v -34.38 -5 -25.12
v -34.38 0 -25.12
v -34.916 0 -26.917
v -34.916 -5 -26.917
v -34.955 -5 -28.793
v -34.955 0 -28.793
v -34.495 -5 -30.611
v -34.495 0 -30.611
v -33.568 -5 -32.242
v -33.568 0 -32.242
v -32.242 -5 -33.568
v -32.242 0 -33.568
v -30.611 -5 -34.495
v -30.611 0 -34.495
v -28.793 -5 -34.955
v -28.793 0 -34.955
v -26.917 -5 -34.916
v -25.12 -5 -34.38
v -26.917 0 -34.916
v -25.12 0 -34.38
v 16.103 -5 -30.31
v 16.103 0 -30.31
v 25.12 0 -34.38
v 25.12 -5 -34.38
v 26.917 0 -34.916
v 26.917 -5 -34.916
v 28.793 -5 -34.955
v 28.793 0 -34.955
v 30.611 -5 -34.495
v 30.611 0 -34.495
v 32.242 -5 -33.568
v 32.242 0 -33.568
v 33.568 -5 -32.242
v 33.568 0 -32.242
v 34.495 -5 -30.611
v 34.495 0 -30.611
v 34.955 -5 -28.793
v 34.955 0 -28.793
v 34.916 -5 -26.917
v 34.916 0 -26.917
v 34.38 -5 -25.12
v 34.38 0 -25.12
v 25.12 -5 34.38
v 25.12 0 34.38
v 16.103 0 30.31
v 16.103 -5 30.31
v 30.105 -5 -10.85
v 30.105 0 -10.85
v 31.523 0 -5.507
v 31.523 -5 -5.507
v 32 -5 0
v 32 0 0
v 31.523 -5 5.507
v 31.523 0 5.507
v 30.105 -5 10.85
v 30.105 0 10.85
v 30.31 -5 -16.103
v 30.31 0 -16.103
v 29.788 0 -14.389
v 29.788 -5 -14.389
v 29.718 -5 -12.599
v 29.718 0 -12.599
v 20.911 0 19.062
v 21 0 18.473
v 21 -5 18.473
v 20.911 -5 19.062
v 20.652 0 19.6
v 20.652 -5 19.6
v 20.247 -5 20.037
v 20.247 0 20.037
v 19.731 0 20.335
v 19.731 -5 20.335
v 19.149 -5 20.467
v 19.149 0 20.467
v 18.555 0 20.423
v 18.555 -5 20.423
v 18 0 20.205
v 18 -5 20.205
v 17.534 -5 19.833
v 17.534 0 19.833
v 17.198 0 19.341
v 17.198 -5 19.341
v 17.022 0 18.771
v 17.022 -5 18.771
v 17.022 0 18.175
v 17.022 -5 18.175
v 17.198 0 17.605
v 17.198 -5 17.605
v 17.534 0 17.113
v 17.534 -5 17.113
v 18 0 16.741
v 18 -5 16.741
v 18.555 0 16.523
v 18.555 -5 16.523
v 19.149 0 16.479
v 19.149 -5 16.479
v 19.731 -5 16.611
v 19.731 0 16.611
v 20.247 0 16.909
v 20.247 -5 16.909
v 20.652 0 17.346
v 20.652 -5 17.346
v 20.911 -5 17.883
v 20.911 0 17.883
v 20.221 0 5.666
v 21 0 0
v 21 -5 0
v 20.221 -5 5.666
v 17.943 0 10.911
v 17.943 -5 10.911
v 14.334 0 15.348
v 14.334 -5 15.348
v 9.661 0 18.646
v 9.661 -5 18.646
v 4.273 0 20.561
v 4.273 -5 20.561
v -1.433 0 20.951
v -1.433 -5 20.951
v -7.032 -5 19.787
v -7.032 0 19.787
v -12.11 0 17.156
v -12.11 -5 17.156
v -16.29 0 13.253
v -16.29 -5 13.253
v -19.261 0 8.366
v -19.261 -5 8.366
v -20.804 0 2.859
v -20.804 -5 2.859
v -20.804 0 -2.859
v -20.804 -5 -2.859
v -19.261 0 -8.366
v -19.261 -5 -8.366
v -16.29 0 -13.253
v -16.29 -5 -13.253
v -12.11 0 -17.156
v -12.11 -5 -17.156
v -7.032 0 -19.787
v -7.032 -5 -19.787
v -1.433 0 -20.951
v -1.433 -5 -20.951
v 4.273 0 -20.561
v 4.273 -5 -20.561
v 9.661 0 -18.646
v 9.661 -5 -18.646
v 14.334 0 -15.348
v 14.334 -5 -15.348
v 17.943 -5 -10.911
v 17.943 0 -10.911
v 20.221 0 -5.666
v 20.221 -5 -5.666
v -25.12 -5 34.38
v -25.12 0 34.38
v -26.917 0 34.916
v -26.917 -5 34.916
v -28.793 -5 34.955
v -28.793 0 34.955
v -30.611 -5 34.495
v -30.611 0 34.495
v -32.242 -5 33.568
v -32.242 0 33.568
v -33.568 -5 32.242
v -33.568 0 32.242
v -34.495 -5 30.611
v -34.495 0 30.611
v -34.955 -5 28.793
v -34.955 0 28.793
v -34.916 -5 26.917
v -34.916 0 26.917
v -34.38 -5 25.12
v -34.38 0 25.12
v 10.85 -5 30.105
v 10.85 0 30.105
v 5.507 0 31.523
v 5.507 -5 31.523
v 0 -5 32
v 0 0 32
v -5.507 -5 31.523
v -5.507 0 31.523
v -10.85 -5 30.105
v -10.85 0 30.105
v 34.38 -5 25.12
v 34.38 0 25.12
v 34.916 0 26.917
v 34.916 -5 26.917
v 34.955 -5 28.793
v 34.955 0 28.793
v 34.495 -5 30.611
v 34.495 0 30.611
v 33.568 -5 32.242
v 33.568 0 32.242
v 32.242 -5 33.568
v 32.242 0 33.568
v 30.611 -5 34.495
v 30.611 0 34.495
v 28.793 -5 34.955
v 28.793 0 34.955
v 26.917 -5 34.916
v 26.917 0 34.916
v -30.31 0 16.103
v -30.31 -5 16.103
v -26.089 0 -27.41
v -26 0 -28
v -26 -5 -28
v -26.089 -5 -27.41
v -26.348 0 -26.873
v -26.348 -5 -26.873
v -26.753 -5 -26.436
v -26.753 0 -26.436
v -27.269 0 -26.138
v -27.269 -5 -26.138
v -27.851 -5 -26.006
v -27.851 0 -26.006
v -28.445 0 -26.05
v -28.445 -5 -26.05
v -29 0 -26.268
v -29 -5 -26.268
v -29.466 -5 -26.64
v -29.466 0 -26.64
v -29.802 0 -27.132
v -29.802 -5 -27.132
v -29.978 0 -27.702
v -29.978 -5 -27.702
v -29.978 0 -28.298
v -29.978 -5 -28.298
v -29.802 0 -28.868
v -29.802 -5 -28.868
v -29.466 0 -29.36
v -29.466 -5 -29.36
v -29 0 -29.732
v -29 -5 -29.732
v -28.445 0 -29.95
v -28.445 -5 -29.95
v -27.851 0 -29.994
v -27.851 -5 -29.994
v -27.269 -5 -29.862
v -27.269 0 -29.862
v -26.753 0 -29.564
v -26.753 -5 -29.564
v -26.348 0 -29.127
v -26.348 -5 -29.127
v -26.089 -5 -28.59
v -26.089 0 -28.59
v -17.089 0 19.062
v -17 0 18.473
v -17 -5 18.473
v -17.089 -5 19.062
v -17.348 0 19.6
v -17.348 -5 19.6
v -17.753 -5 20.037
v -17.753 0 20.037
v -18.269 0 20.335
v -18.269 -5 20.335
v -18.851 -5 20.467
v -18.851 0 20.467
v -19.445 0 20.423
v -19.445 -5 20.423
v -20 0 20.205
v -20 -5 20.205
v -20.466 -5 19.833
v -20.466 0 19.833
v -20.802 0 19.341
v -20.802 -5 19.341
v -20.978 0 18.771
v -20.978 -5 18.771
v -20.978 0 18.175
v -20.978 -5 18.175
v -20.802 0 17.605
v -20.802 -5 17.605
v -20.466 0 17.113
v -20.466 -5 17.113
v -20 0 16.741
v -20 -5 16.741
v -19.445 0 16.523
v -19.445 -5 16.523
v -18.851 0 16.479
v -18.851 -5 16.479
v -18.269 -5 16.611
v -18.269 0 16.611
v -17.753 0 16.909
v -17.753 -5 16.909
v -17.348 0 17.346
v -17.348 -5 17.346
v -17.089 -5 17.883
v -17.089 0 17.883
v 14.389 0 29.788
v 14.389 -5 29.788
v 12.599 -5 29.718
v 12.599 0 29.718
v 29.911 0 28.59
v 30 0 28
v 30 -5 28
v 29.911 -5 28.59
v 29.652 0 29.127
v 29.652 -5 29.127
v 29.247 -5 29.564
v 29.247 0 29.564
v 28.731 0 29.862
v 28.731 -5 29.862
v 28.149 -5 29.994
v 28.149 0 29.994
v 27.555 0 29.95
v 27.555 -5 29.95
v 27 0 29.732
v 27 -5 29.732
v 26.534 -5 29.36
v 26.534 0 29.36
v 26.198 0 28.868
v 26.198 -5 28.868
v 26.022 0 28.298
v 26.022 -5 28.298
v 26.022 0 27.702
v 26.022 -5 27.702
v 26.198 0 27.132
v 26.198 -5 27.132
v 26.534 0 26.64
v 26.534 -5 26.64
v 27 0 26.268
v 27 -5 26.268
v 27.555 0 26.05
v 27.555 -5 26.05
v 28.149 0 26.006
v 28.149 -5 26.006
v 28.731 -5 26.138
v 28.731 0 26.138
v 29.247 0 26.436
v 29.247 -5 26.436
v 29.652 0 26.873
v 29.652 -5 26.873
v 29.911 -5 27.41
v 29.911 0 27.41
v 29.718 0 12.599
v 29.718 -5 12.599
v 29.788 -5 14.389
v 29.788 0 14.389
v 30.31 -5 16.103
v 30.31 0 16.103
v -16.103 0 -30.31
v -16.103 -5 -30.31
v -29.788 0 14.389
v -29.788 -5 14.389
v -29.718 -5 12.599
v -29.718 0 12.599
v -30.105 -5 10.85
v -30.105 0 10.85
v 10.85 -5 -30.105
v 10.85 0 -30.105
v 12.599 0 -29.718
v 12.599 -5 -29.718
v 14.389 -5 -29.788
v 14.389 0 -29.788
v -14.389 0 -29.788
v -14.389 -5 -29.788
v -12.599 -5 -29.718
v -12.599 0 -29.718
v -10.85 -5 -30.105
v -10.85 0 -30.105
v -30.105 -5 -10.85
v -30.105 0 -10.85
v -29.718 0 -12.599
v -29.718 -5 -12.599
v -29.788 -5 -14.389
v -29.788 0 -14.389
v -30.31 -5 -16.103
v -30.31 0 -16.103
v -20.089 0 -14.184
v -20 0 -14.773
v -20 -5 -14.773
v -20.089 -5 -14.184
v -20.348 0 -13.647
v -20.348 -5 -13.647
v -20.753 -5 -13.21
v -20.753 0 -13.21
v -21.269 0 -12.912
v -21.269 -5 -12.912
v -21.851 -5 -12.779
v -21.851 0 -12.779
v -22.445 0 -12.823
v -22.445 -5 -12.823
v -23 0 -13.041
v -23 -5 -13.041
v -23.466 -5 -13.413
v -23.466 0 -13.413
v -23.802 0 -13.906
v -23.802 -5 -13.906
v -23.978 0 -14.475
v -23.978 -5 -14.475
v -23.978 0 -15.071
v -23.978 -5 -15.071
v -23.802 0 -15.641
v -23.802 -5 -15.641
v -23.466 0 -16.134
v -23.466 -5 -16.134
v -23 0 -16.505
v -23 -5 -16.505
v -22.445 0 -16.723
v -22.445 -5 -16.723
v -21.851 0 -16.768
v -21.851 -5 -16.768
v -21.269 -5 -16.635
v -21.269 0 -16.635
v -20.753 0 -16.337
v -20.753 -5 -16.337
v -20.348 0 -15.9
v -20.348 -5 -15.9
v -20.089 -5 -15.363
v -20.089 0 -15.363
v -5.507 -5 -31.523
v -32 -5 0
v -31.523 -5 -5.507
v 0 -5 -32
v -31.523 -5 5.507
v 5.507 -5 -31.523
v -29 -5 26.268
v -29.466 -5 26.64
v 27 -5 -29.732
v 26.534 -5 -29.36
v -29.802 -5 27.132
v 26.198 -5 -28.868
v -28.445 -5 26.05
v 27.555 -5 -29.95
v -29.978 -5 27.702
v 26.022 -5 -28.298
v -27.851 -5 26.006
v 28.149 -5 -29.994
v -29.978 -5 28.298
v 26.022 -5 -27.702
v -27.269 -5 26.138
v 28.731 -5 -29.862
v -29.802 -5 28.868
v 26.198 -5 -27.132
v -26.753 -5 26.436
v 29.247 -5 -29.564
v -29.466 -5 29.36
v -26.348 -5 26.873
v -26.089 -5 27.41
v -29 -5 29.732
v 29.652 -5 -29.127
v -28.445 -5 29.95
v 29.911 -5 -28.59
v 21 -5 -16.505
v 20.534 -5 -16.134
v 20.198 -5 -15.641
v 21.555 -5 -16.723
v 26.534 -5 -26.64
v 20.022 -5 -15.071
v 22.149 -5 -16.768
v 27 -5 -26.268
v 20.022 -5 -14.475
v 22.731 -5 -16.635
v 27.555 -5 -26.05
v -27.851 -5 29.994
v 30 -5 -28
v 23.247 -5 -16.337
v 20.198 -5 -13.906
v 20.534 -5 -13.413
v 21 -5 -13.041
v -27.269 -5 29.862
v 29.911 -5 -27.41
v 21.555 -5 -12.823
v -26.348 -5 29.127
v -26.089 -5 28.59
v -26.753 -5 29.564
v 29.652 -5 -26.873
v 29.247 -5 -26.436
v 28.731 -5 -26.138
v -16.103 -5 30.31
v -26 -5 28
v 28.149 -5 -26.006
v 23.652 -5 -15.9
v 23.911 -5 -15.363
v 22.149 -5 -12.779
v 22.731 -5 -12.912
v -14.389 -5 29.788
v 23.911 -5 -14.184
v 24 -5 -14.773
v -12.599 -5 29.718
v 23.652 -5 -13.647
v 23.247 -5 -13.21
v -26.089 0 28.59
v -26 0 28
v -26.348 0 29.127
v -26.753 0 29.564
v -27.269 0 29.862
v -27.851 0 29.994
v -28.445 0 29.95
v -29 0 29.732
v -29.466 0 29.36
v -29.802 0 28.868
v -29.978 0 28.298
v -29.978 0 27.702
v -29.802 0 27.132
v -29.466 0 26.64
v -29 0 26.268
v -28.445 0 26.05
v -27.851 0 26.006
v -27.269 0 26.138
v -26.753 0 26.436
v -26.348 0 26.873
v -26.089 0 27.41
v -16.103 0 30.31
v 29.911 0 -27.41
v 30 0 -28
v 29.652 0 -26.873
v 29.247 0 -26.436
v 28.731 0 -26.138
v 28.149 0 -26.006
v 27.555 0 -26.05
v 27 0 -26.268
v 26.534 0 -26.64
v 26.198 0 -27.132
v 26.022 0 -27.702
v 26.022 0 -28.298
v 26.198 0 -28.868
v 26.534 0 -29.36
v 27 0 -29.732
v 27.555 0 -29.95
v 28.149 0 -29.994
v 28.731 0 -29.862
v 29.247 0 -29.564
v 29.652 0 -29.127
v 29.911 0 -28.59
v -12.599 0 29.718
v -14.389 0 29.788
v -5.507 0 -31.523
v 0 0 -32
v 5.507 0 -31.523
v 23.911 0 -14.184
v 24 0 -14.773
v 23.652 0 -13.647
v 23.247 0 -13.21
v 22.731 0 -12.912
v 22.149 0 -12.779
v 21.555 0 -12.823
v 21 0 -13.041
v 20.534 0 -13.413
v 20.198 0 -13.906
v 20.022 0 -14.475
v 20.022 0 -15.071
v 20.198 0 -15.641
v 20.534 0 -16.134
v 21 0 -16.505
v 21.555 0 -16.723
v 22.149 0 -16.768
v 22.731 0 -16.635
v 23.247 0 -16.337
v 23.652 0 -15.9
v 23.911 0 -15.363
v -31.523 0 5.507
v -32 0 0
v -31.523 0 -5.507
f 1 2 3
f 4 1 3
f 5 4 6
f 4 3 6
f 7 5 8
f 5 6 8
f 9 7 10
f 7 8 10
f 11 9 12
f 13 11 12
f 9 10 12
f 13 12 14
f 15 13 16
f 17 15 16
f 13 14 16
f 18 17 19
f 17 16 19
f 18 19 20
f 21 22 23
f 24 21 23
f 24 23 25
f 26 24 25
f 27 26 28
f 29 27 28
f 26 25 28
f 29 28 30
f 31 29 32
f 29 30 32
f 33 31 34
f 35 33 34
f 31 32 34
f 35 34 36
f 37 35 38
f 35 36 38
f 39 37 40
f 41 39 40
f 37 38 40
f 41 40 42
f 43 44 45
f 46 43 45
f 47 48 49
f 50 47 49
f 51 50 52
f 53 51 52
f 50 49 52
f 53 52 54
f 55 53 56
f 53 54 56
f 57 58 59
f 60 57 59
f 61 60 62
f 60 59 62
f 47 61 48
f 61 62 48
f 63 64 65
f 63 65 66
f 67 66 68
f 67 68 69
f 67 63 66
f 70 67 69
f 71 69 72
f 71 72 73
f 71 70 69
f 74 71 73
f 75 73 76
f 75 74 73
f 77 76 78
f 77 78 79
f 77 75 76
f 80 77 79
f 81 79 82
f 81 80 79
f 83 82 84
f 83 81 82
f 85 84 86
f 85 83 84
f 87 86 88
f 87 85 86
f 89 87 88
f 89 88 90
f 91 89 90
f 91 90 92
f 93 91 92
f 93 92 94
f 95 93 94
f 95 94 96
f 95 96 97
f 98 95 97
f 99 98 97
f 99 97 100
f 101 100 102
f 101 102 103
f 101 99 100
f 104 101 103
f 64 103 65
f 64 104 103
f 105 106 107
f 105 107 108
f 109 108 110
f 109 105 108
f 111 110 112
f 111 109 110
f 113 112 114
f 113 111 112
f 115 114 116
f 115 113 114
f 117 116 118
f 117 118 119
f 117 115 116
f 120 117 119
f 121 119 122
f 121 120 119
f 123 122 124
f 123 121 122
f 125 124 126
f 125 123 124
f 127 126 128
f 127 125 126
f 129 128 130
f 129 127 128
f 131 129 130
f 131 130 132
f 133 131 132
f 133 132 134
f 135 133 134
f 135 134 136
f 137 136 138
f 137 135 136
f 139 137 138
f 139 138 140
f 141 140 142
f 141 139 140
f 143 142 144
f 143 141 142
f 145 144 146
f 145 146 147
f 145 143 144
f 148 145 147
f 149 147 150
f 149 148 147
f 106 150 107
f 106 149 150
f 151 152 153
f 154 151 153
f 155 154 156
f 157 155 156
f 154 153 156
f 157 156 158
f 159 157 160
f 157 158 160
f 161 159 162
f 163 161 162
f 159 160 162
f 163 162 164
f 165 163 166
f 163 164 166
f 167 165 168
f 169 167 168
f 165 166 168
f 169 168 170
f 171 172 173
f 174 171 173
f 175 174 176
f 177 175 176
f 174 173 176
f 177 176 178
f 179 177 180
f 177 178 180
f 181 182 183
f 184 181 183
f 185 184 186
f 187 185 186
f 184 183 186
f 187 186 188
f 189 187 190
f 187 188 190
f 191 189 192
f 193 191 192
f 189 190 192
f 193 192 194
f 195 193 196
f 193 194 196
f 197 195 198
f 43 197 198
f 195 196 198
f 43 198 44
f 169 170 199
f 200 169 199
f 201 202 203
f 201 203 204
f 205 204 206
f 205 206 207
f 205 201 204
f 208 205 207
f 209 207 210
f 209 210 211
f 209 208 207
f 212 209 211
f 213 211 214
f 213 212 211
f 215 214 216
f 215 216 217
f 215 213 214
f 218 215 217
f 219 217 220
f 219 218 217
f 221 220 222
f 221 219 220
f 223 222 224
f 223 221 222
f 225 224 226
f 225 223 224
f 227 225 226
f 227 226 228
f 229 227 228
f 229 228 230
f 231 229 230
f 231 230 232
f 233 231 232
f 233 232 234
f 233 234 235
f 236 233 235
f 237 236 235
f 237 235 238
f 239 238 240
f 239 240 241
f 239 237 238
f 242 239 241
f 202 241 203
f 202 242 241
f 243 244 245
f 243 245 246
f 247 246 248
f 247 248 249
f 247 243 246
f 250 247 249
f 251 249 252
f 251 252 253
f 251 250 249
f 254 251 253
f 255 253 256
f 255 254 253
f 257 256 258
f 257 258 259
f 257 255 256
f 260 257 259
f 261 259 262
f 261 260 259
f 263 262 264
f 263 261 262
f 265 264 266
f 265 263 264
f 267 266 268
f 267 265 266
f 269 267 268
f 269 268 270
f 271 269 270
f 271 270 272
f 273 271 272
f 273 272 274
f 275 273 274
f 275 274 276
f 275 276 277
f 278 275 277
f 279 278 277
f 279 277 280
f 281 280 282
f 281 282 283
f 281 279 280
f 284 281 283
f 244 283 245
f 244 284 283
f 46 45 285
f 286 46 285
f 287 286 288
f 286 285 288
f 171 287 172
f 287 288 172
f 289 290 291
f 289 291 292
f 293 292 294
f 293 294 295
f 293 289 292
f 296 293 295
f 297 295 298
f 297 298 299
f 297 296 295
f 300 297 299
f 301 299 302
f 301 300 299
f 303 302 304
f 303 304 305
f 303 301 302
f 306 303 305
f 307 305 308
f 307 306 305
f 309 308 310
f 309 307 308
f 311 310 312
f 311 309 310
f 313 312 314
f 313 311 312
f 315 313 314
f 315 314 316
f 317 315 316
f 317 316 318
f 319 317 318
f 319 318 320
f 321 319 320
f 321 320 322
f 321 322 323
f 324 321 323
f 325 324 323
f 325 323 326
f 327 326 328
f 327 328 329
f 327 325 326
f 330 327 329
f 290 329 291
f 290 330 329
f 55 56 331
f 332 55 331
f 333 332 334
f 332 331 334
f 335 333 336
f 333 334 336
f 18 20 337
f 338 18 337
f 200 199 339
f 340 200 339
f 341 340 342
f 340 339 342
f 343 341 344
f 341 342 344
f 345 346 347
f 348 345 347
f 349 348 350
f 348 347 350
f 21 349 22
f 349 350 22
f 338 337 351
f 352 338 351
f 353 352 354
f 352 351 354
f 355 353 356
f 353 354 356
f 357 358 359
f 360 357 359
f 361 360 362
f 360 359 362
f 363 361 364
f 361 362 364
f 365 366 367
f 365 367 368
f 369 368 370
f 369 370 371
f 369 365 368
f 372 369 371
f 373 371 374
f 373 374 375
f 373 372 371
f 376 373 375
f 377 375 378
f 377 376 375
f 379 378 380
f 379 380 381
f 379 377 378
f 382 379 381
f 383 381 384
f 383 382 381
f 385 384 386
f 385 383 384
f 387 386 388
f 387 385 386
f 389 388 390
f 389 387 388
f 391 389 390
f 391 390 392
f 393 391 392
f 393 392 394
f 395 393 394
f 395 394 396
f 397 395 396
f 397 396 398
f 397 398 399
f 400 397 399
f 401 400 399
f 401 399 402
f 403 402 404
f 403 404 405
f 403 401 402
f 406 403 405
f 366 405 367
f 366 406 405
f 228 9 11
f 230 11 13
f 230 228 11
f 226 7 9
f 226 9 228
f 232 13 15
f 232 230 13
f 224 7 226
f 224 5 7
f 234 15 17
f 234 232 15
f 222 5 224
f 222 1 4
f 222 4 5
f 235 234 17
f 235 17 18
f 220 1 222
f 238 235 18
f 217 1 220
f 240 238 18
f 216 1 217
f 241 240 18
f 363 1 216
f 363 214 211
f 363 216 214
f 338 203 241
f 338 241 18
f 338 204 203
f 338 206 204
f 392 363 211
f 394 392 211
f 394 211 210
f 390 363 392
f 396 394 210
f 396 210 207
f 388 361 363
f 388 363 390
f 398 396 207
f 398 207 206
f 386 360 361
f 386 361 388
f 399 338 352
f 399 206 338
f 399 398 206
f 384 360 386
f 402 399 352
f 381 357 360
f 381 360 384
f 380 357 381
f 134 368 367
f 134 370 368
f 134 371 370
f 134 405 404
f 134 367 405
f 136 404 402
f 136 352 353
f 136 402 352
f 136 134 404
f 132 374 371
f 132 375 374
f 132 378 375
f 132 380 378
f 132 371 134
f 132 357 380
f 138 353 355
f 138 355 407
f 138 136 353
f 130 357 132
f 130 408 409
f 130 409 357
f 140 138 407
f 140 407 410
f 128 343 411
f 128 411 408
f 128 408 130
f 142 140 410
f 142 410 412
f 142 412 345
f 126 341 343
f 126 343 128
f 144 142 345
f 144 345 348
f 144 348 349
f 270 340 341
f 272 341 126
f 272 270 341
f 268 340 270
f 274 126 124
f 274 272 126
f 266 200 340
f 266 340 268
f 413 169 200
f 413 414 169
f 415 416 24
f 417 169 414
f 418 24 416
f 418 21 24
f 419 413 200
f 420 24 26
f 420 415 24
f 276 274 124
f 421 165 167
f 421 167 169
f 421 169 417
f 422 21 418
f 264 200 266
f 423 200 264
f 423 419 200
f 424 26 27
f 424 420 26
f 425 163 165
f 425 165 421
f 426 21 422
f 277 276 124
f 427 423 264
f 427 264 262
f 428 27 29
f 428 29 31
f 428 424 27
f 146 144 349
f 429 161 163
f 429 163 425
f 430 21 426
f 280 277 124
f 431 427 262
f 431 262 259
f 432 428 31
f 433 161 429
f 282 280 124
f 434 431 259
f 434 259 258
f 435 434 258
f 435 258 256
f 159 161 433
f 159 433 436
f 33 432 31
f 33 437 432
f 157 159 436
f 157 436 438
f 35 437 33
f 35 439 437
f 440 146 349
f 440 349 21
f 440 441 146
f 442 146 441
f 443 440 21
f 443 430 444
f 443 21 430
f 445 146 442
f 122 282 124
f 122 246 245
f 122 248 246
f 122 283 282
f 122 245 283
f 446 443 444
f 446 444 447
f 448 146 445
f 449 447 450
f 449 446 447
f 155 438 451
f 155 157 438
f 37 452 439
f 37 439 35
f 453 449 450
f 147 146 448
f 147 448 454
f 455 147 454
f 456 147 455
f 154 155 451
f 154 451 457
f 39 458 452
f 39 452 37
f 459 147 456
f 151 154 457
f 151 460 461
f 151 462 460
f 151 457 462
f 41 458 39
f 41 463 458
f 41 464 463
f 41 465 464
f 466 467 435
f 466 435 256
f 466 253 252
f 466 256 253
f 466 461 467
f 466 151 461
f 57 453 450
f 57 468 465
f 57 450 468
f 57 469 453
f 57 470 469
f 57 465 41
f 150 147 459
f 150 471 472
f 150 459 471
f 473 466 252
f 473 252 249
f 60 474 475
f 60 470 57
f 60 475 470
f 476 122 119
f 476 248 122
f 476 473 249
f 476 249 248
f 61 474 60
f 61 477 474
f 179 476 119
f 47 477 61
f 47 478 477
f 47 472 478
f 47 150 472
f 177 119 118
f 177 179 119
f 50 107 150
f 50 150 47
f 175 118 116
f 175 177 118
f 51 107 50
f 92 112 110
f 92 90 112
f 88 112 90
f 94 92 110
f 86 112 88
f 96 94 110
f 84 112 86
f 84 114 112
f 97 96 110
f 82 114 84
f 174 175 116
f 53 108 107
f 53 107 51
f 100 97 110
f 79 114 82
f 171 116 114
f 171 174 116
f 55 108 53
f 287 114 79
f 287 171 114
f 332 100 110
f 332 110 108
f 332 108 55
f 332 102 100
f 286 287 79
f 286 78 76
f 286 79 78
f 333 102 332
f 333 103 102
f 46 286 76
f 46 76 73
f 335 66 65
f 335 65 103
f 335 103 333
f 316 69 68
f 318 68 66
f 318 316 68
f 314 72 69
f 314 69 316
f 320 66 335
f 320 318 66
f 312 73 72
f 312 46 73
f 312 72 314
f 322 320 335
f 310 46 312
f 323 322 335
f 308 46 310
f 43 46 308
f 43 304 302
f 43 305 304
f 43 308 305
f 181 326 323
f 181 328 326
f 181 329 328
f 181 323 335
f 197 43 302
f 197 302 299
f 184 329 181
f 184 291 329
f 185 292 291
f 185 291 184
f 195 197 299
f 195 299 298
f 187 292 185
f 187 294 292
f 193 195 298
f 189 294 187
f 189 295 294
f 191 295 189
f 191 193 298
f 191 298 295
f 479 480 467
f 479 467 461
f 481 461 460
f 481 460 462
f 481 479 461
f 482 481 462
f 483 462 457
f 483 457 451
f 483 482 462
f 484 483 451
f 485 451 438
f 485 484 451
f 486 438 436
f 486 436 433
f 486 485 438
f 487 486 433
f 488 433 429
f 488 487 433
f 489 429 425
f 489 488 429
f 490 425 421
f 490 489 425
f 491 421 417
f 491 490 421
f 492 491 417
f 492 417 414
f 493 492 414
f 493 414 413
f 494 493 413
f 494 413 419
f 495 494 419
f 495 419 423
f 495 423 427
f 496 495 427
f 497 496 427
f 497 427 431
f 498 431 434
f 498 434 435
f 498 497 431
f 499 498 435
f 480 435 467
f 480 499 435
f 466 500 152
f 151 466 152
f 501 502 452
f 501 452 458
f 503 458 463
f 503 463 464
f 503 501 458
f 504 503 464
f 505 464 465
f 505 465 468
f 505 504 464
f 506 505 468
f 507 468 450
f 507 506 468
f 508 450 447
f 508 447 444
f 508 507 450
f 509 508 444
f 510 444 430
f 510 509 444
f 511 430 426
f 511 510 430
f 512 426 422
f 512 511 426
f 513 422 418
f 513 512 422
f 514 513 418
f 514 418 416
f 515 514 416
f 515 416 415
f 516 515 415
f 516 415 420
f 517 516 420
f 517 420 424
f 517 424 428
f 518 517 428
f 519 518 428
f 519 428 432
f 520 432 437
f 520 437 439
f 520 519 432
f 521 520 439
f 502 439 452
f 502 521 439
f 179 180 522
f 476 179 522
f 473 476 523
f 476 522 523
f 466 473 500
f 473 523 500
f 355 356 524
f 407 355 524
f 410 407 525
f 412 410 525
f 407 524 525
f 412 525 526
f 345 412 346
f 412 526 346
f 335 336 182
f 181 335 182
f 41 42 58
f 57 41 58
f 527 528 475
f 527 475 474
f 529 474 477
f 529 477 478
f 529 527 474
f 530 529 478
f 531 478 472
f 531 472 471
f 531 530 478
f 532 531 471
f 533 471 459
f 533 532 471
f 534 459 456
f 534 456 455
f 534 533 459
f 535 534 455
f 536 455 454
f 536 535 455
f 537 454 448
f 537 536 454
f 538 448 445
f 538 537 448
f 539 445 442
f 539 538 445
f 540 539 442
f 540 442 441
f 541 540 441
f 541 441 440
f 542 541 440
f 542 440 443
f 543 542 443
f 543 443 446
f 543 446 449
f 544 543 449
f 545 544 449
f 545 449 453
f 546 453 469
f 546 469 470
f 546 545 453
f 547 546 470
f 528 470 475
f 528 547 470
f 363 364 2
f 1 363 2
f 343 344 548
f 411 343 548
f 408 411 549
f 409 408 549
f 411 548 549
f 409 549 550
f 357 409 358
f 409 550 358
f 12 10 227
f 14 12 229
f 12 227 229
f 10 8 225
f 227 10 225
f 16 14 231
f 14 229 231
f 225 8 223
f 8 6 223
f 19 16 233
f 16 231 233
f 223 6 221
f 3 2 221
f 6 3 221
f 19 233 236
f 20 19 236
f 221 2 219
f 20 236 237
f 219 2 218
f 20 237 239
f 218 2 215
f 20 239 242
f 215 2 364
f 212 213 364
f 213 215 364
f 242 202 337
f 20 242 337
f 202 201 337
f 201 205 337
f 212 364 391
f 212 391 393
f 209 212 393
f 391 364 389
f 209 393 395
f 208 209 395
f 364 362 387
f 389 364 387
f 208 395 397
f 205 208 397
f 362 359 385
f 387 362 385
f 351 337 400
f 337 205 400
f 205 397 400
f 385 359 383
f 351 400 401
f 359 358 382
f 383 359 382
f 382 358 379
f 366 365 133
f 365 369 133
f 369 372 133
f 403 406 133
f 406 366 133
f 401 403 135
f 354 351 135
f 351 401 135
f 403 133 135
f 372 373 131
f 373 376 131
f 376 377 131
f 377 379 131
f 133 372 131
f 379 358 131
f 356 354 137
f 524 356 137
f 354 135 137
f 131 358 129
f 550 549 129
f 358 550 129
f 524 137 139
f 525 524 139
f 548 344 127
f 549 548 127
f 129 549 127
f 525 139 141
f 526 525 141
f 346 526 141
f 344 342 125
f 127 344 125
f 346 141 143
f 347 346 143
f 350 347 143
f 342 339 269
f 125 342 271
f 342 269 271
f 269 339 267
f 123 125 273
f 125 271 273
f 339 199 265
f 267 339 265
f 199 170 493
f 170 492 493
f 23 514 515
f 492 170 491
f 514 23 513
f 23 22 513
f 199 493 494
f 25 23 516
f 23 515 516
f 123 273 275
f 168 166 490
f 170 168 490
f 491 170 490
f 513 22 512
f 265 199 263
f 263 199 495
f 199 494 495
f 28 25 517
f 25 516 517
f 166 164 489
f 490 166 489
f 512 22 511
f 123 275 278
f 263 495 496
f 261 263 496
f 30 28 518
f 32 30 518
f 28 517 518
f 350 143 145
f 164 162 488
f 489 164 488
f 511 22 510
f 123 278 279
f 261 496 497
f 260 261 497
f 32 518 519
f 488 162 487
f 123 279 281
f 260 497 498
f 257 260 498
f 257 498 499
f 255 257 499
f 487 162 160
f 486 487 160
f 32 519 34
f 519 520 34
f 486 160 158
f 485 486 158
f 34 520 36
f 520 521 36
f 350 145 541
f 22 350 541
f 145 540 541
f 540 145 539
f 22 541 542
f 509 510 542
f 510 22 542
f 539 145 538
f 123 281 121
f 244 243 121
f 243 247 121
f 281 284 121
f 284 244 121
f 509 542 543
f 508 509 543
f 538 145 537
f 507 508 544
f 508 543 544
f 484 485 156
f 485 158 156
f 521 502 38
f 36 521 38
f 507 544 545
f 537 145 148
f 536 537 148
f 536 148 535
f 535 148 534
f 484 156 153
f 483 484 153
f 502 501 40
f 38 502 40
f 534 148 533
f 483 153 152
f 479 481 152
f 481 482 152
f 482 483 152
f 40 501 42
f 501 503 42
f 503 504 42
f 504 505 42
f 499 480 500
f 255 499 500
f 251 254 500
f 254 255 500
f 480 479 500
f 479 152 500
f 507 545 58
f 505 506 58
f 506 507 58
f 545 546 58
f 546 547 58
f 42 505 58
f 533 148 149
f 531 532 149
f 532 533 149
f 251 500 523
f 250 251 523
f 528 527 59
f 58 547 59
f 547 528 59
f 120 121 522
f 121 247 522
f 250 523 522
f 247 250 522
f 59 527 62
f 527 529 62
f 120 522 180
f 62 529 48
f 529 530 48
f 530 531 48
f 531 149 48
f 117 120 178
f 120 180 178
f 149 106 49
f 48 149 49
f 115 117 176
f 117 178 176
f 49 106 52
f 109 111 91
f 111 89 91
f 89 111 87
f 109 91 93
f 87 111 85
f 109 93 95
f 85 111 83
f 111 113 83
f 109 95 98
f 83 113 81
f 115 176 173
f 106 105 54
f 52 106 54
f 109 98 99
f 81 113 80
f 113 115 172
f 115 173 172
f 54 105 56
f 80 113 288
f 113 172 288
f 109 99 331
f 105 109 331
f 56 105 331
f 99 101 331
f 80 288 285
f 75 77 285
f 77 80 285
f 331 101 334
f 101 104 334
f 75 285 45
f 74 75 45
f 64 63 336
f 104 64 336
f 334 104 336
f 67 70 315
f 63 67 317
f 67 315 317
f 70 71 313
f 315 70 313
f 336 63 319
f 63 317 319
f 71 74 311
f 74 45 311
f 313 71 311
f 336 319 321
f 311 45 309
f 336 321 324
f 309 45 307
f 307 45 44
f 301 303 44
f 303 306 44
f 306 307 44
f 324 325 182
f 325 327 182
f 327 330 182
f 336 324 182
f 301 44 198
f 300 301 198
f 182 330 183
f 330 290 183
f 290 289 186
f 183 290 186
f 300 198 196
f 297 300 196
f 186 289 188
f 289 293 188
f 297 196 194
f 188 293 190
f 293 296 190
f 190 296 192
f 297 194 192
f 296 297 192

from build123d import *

# Parameters (mm, degrees)
F0_R     = 2
F0_R_2   = 21
F1_DEPTH = 5


with BuildPart() as f1:
    # F0 (on Front) → F1 (new body)
    with BuildSketch(Plane.XZ):
        with BuildLine():
            ThreePointArc((-25.119935, 34.380065), (-32.949747, 32.949747), (-34.380065, 25.119935))
            Line((-34.380065, 25.119935), (-30.309803, 16.103286))
            ThreePointArc((-30.309803, 16.103286), (-29.695207, 13.496561), (-30.104507, 10.849823))
            ThreePointArc((-30.104507, 10.849823), (-32, 0), (-30.104507, -10.849823))
            ThreePointArc((-30.104507, -10.849823), (-29.695207, -13.496561), (-30.309803, -16.103287))
            Line((-30.309803, -16.103287), (-34.380065, -25.119937))
            ThreePointArc((-34.380065, -25.119937), (-32.949747, -32.949749), (-25.119935, -34.380066))
            Line((-25.119935, -34.380066), (-16.103285, -30.309804))
            ThreePointArc((-16.103285, -30.309804), (-13.49656, -29.695207), (-10.849822, -30.104507))
            ThreePointArc((-10.849822, -30.104507), (1e-06, -32), (10.849823, -30.104507))
            ThreePointArc((10.849823, -30.104507), (13.496561, -29.695207), (16.103286, -30.309803))
            Line((16.103286, -30.309803), (25.119935, -34.380065))
            ThreePointArc((25.119935, -34.380065), (32.949747, -32.949747), (34.380065, -25.119935))
            Line((34.380065, -25.119935), (30.309803, -16.103286))
            ThreePointArc((30.309803, -16.103286), (29.695207, -13.496561), (30.104507, -10.849823))
            ThreePointArc((30.104507, -10.849823), (32, 0), (30.104507, 10.849823))
            ThreePointArc((30.104507, 10.849823), (29.695207, 13.496561), (30.309803, 16.103286))
            Line((30.309803, 16.103286), (34.380065, 25.119935))
            ThreePointArc((34.380065, 25.119935), (32.949747, 32.949747), (25.119935, 34.380065))
            Line((25.119935, 34.380065), (16.103286, 30.309803))
            ThreePointArc((16.103286, 30.309803), (13.496561, 29.695207), (10.849823, 30.104507))
            ThreePointArc((10.849823, 30.104507), (0, 32), (-10.849823, 30.104507))
            ThreePointArc((-10.849823, 30.104507), (-13.496561, 29.695207), (-16.103286, 30.309803))
            Line((-16.103286, 30.309803), (-25.119935, 34.380065))
        make_face()
        with Locations((-28, -28.000001)):
            Circle(F0_R, mode=Mode.SUBTRACT)
        with Locations((-22, -14.773287)):
            Circle(F0_R, mode=Mode.SUBTRACT)
        with Locations((28, -28)):
            Circle(F0_R, mode=Mode.SUBTRACT)
        with Locations((22, -14.773287)):
            Circle(F0_R, mode=Mode.SUBTRACT)
        with Locations((-19, 18.472953)):
            Circle(F0_R, mode=Mode.SUBTRACT)
        with Locations((-28, 28)):
            Circle(F0_R, mode=Mode.SUBTRACT)
        Circle(F0_R_2, mode=Mode.SUBTRACT)
        with Locations((19, 18.472953)):
            Circle(F0_R, mode=Mode.SUBTRACT)
        with Locations((28, 28)):
            Circle(F0_R, mode=Mode.SUBTRACT)
    extrude(amount=F1_DEPTH)


solid = f1.part
